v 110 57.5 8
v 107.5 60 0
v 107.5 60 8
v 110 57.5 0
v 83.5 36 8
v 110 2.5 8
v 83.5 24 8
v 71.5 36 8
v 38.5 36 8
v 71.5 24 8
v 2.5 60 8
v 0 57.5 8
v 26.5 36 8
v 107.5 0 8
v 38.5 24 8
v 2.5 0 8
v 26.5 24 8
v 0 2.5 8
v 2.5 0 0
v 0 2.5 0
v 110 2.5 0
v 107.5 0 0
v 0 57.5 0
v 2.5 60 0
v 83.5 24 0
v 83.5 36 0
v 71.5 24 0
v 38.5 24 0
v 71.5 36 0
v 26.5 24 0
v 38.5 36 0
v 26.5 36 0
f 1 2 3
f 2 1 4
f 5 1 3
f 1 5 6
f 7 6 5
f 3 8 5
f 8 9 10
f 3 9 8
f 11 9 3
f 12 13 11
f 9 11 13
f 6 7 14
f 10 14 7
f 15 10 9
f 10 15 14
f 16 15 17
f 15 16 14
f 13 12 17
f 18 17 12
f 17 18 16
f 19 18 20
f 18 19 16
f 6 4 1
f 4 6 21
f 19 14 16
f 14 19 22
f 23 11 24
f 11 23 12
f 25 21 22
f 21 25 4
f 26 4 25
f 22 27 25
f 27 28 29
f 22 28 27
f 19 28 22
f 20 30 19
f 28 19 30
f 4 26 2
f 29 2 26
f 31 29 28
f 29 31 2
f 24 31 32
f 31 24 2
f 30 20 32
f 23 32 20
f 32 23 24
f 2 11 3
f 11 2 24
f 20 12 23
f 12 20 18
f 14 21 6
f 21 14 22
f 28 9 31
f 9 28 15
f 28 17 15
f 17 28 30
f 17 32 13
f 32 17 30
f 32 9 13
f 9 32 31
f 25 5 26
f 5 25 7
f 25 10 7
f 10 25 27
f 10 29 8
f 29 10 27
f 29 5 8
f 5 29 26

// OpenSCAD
$fn = 32;

// ----------------------------------------------------------------------
// Windowed plate: 2 voids, 110 x 60 x 8 mm
// ----------------------------------------------------------------------

// --- parameters (mm) ---
plate_l = 110;            // plate length, X
plate_w = 60;             // plate width, Y
plate_t = 8;              // plate thickness, Z
edge_margin = 10;         // wall from the plate edge to any window
windows = 2;              // number of windows in the row
win_l = 12;               // window length
win_w = 12;               // window width
win_pitch = 45;           // window pitch along X
depth_1 = 8;              // depth of void 1 (full thickness = through)
depth_2 = 8;              // depth of void 2 (full thickness = through)
corner_c = 2.5;           // corner chamfer of the plate

profile = [[2.5, 0], [107.5, 0], [110, 2.5], [110, 57.5], [107.5, 60], [2.5, 60], [0, 57.5], [0, 2.5]];  // primary outline, 8 points, counter clockwise
void_1 = [[26.5, 24], [38.5, 24], [38.5, 36], [26.5, 36]];  // window 1 of the row, 4 points
void_2 = [[71.5, 24], [83.5, 24], [83.5, 36], [71.5, 36]];  // window 2 of the row, 4 points

// --- the one profile operation ---
difference() {
  linear_extrude(height = plate_t) polygon(points = profile);
  translate([0, 0, -1])
    linear_extrude(height = plate_t + 2) polygon(points = void_1);
  translate([0, 0, -1])
    linear_extrude(height = plate_t + 2) polygon(points = void_2);
}
